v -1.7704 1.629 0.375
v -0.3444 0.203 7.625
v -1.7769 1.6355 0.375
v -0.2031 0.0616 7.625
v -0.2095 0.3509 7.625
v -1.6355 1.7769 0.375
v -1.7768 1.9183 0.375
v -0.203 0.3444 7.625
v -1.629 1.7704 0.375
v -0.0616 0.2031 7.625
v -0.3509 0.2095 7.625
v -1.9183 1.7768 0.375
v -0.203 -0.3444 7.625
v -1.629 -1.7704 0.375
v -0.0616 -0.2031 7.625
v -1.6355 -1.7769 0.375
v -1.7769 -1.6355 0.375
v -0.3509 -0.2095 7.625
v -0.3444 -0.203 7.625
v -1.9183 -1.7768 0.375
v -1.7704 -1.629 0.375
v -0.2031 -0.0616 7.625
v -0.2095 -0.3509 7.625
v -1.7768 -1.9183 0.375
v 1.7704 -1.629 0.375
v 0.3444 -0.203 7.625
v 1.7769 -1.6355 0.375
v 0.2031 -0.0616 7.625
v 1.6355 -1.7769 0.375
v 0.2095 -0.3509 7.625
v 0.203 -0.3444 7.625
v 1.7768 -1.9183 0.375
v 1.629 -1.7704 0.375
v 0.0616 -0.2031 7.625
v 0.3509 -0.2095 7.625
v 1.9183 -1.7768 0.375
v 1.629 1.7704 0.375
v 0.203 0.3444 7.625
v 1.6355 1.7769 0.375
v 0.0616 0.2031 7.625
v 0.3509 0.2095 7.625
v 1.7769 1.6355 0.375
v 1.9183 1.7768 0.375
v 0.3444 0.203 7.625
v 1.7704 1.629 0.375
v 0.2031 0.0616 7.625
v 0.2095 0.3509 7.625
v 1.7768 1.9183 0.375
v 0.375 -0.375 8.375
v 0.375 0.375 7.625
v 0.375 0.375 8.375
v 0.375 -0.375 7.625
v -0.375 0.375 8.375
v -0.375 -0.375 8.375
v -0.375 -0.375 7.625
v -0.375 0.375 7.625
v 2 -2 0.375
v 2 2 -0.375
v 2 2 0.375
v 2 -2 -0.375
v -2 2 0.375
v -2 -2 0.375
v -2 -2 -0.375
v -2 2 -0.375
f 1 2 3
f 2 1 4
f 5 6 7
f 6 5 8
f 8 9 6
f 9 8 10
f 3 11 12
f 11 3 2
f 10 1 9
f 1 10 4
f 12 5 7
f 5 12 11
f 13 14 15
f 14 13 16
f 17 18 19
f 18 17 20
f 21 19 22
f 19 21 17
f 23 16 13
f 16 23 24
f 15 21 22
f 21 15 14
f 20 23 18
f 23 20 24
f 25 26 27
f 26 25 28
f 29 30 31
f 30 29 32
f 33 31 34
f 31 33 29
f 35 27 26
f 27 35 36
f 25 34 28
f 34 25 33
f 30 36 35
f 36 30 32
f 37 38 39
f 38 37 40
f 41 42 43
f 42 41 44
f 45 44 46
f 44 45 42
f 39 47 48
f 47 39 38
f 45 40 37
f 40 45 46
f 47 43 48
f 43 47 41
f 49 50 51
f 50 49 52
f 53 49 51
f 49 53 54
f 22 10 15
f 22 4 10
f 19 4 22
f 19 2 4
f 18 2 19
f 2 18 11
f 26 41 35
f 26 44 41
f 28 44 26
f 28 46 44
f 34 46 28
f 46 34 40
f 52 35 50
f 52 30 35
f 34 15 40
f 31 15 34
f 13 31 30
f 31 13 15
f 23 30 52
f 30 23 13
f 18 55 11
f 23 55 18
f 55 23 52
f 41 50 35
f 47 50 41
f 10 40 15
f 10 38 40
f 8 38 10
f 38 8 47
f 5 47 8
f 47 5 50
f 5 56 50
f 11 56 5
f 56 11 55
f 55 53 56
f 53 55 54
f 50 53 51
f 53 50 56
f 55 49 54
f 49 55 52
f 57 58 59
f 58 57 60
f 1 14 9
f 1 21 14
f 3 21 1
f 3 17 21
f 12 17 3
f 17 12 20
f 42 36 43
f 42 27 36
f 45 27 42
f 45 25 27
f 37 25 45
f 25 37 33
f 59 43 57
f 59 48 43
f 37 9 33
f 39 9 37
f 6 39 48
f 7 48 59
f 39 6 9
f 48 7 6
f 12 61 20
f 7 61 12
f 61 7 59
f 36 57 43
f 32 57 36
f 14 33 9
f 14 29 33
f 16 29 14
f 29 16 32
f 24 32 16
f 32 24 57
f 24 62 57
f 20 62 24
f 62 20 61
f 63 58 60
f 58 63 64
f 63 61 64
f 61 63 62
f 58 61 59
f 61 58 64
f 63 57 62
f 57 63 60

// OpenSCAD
use <lib.scad>

hd = 72;
ld = 16;
vld = 8;

module platform() {
	translate([0,0,-4.75]) union() {
		translate([0,0,4.5]) box([9,9,0.5]);
		translate([3,3,0]) cyl(1,1,9);
		translate([3,-3,0]) cyl(1,1,9);
		translate([-3,3,0]) cyl(1,1,9);
		translate([-3,-3,0]) cyl(1,1,9);
		translate([0,3,4]) box([6,0.5,1]);
		rotate([0,0,90]) translate([0,3,4]) box([6,0.5,1]);
		translate([0,-3,4]) box([6,0.5,1]);
		rotate([0,0,90]) translate([0,-3,4]) box([6,0.5,1]);
	}
}

module tower() {
	translate([0,0,4]) union() {
		translate([0,0,4]) box([0.75,0.75,0.75]);
		translate([0,0,-4]) box([4,4,0.75]);

		for (i = [0:1:3])
			rotate([0,0,i*90+45]) translate([0,1.4,0]) rotate([17,0,0]) box([0.2,0.2,8.25]);

		if ($fn > vld) {
			translate([0,0,-3]) for (i = [0:1:3])
				rotate([0,0,i*90]) translate([1.62,0,0]) box([0.1,3.4,0.1]);
			translate([0,0,-1]) for (i = [0:1:3])
				rotate([0,0,i*90]) translate([1.22,0,0]) box([0.1,2.5,0.1]);
			translate([0,0,1]) for (i = [0:1:3])
				rotate([0,0,i*90]) translate([0.81,0,0]) box([0.1,1.6,0.1]);

			for (i = [0:1:3])
				rotate([0,0,i*90]) translate([0.95,0,0.2]) rotate([0,-12,0]) rotate([47,0,0]) translate([0,-0.3,0]) box([0.1,2.9,0.1]);

			for (i = [0:1:3])
				rotate([0,0,i*90]) translate([1.4,0,-1.9]) rotate([0,-12,0]) rotate([-36,0,0]) translate([0,0.3,0]) box([0.1,3.4,0.1]);
		}
	}
}

//platform($fn=vld);
tower($fn=vld);
